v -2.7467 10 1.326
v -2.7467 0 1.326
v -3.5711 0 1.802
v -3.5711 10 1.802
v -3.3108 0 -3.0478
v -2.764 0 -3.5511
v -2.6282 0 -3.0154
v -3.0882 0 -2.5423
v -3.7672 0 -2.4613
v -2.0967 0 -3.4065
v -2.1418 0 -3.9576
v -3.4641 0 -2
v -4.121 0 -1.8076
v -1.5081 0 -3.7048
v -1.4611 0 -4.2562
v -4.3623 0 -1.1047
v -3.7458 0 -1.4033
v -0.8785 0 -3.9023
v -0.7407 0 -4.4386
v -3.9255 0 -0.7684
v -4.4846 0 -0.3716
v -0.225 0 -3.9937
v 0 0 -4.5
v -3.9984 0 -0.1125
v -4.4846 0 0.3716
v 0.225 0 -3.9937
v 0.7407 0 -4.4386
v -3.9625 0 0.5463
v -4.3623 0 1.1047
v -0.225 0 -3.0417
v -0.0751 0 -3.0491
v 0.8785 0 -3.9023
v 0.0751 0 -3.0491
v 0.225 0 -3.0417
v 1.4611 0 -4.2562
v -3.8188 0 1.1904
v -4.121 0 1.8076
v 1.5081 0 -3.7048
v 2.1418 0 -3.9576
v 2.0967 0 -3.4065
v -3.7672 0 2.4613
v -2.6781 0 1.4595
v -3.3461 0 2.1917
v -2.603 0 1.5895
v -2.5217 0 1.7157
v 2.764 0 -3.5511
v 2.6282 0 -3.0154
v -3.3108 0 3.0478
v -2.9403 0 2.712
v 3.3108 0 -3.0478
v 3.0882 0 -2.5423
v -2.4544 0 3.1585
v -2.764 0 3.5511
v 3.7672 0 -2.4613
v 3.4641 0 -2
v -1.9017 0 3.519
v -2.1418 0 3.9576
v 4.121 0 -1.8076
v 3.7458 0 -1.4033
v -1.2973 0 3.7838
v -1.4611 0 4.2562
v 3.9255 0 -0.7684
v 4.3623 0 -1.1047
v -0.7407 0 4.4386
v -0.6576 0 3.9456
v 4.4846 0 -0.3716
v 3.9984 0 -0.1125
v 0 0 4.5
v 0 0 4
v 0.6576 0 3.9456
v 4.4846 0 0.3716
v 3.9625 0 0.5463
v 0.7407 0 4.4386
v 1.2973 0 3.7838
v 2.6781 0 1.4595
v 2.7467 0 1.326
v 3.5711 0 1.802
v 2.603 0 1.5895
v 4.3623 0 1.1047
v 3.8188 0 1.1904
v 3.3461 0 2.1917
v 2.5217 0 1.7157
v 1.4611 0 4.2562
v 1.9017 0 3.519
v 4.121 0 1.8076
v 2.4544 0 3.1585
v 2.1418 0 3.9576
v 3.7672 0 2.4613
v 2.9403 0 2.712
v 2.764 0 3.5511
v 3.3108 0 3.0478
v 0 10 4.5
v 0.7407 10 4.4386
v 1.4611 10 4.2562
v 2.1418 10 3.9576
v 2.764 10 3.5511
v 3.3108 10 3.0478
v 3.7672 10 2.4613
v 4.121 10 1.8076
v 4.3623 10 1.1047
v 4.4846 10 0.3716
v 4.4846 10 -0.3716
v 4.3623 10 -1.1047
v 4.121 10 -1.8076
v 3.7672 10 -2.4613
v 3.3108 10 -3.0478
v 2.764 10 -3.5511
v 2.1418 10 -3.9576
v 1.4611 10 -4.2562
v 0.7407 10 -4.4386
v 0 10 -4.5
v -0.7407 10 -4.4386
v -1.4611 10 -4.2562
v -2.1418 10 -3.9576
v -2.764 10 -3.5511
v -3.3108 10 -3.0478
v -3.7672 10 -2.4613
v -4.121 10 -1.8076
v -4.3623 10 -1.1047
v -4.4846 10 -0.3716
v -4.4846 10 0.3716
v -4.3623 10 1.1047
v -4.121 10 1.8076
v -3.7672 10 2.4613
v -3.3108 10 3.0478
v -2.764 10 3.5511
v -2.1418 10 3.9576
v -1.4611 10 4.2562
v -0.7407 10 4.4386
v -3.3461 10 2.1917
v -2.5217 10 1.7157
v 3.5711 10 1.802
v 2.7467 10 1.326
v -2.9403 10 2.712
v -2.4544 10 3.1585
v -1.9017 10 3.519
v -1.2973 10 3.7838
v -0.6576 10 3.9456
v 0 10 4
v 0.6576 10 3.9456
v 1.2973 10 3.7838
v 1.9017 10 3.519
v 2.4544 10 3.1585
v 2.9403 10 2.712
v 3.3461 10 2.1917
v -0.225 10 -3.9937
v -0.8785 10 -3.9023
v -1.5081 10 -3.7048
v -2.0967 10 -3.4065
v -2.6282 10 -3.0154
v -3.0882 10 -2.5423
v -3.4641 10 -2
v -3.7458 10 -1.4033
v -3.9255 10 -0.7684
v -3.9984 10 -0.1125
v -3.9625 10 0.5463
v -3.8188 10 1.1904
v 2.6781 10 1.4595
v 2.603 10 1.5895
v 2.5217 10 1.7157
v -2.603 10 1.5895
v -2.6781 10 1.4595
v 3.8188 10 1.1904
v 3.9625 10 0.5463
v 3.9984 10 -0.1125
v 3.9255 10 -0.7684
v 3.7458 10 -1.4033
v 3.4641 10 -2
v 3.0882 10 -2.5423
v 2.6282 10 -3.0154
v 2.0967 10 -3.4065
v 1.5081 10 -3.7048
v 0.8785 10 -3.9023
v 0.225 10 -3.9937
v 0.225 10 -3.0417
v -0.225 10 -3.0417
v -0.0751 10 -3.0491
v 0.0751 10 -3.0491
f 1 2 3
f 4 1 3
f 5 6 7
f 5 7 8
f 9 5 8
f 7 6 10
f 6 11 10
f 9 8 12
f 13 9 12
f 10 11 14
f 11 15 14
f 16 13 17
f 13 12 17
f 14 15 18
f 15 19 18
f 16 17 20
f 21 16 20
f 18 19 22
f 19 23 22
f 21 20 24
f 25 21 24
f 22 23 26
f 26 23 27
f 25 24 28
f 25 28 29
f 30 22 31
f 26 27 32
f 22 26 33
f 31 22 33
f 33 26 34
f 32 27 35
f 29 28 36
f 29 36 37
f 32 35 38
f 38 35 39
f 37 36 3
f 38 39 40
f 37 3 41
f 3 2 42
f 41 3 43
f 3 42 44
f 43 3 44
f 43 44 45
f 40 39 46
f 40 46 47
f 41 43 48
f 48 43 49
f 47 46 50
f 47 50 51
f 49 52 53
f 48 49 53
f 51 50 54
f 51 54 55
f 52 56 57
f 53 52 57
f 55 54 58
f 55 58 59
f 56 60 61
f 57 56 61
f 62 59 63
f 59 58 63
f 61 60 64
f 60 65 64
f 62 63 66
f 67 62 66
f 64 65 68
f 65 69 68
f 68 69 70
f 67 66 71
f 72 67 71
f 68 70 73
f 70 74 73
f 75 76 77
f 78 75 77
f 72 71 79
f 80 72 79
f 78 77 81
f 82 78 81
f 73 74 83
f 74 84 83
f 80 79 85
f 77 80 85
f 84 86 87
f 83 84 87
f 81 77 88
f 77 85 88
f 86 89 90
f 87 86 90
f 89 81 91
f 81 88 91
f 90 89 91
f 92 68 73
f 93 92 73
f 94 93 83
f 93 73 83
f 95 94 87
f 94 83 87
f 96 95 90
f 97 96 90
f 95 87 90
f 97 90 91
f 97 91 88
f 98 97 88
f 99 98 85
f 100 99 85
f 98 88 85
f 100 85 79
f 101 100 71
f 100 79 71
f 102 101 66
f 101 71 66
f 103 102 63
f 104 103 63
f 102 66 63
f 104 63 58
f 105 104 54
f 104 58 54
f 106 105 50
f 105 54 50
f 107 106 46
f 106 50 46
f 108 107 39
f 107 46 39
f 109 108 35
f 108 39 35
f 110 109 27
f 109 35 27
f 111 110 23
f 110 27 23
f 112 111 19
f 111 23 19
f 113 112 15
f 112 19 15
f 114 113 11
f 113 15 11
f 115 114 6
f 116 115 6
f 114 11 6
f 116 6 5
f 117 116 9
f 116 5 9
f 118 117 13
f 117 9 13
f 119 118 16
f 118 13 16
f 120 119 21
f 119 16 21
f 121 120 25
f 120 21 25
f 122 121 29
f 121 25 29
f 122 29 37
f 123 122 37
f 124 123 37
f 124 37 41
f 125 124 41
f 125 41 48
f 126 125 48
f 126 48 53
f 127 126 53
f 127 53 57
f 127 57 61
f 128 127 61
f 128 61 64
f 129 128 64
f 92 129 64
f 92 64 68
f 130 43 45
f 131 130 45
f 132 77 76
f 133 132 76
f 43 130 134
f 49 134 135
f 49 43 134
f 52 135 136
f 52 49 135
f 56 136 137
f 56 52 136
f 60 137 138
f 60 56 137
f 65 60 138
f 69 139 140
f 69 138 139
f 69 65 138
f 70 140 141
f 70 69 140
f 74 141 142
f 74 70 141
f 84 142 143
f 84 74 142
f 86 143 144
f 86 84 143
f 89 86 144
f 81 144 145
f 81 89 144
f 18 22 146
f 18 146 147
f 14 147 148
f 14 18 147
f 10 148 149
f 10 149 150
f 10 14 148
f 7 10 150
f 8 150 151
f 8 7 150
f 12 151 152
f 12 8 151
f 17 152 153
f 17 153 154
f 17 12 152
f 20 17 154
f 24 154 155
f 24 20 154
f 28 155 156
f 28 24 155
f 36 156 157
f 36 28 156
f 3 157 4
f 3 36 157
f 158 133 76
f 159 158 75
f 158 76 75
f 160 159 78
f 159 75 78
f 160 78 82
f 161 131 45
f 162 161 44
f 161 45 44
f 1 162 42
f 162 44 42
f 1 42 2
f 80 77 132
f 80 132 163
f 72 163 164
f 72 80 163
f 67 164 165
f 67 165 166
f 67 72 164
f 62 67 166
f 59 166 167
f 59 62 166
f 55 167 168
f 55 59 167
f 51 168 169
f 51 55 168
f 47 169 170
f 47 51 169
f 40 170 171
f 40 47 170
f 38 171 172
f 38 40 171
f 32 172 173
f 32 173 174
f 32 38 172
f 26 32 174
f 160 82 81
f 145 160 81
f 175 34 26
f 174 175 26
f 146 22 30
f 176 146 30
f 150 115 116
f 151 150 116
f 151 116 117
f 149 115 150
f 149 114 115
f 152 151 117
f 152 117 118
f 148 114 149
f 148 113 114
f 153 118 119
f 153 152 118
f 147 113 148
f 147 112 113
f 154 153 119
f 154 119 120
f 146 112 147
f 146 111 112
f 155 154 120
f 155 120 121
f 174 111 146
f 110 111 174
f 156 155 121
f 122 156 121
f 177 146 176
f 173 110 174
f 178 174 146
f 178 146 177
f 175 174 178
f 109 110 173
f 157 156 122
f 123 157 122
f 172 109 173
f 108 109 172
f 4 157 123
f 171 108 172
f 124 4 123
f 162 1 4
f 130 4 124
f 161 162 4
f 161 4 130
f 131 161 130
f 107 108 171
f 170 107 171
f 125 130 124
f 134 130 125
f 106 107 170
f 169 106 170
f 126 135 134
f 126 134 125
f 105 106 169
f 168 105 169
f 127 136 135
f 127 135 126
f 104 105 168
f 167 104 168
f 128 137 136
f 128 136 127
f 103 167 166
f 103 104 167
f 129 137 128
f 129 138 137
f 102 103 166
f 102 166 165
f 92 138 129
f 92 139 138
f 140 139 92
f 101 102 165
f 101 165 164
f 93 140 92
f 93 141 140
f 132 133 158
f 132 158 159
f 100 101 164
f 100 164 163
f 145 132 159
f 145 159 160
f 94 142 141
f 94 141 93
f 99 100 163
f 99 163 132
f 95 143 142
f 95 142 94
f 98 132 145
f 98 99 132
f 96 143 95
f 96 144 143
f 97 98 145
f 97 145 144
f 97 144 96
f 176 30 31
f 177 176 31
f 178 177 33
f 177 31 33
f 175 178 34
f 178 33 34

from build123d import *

# Parameters (mm, degrees)
SKETCH1_R           = 4.5
SKETCH1_R_2         = 4
BOSS_EXTRUDE1_DEPTH = 10
BOSS_EXTRUDE2_START = -10
BOSS_EXTRUDE2_DEPTH = 10


with BuildPart() as part:
    # Sketch1 → Boss-Extrude1 (new body)
    with BuildSketch(Plane(origin=(0, 0, 0), x_dir=(1, 0, 0), z_dir=(0, 1, 0))):
        with Locations(Location((0, 0, 0), (0, 0, 270))):
            Circle(SKETCH1_R)
        with Locations(Location((0, 0, 0), (0, 0, 270))):
            Circle(SKETCH1_R_2, mode=Mode.SUBTRACT)
    extrude(amount=BOSS_EXTRUDE1_DEPTH)

    # Sketch2 → Boss-Extrude2 (add)
    with BuildSketch(Plane(origin=(0, 10, 0), x_dir=(1, 0, 0), z_dir=(0, 1, 0)).offset(BOSS_EXTRUDE2_START)):
        with BuildLine():
            ThreePointArc((-0.225, 3.041689498), (0, 3.05), (0.225, 3.041689498))
            Line((0.225, 3.041689498), (0.225, 3.993666861))
            ThreePointArc((0.225, 3.993666861), (0, 4), (-0.225, 3.993666861))
            Line((-0.225, 3.993666861), (-0.225, 3.041689498))
        make_face()
        with BuildLine():
            Line((3.571116956, -1.801977715), (2.746680375, -1.325989033))
            ThreePointArc((2.746680375, -1.325989033), (2.641377482, -1.525), (2.521680375, -1.715700465))
            Line((2.521680375, -1.715700465), (3.346116956, -2.191689147))
            ThreePointArc((3.346116956, -2.191689147), (3.464101615, -2), (3.571116956, -1.801977715))
        make_face()
        with BuildLine():
            Line((-3.346116956, -2.191689147), (-2.521680375, -1.715700465))
            ThreePointArc((-2.521680375, -1.715700465), (-2.641377482, -1.525), (-2.746680375, -1.325989033))
            Line((-2.746680375, -1.325989033), (-3.571116956, -1.801977715))
            ThreePointArc((-3.571116956, -1.801977715), (-3.464101615, -2), (-3.346116956, -2.191689147))
        make_face()
    extrude(amount=BOSS_EXTRUDE2_DEPTH)


solid = part.part
